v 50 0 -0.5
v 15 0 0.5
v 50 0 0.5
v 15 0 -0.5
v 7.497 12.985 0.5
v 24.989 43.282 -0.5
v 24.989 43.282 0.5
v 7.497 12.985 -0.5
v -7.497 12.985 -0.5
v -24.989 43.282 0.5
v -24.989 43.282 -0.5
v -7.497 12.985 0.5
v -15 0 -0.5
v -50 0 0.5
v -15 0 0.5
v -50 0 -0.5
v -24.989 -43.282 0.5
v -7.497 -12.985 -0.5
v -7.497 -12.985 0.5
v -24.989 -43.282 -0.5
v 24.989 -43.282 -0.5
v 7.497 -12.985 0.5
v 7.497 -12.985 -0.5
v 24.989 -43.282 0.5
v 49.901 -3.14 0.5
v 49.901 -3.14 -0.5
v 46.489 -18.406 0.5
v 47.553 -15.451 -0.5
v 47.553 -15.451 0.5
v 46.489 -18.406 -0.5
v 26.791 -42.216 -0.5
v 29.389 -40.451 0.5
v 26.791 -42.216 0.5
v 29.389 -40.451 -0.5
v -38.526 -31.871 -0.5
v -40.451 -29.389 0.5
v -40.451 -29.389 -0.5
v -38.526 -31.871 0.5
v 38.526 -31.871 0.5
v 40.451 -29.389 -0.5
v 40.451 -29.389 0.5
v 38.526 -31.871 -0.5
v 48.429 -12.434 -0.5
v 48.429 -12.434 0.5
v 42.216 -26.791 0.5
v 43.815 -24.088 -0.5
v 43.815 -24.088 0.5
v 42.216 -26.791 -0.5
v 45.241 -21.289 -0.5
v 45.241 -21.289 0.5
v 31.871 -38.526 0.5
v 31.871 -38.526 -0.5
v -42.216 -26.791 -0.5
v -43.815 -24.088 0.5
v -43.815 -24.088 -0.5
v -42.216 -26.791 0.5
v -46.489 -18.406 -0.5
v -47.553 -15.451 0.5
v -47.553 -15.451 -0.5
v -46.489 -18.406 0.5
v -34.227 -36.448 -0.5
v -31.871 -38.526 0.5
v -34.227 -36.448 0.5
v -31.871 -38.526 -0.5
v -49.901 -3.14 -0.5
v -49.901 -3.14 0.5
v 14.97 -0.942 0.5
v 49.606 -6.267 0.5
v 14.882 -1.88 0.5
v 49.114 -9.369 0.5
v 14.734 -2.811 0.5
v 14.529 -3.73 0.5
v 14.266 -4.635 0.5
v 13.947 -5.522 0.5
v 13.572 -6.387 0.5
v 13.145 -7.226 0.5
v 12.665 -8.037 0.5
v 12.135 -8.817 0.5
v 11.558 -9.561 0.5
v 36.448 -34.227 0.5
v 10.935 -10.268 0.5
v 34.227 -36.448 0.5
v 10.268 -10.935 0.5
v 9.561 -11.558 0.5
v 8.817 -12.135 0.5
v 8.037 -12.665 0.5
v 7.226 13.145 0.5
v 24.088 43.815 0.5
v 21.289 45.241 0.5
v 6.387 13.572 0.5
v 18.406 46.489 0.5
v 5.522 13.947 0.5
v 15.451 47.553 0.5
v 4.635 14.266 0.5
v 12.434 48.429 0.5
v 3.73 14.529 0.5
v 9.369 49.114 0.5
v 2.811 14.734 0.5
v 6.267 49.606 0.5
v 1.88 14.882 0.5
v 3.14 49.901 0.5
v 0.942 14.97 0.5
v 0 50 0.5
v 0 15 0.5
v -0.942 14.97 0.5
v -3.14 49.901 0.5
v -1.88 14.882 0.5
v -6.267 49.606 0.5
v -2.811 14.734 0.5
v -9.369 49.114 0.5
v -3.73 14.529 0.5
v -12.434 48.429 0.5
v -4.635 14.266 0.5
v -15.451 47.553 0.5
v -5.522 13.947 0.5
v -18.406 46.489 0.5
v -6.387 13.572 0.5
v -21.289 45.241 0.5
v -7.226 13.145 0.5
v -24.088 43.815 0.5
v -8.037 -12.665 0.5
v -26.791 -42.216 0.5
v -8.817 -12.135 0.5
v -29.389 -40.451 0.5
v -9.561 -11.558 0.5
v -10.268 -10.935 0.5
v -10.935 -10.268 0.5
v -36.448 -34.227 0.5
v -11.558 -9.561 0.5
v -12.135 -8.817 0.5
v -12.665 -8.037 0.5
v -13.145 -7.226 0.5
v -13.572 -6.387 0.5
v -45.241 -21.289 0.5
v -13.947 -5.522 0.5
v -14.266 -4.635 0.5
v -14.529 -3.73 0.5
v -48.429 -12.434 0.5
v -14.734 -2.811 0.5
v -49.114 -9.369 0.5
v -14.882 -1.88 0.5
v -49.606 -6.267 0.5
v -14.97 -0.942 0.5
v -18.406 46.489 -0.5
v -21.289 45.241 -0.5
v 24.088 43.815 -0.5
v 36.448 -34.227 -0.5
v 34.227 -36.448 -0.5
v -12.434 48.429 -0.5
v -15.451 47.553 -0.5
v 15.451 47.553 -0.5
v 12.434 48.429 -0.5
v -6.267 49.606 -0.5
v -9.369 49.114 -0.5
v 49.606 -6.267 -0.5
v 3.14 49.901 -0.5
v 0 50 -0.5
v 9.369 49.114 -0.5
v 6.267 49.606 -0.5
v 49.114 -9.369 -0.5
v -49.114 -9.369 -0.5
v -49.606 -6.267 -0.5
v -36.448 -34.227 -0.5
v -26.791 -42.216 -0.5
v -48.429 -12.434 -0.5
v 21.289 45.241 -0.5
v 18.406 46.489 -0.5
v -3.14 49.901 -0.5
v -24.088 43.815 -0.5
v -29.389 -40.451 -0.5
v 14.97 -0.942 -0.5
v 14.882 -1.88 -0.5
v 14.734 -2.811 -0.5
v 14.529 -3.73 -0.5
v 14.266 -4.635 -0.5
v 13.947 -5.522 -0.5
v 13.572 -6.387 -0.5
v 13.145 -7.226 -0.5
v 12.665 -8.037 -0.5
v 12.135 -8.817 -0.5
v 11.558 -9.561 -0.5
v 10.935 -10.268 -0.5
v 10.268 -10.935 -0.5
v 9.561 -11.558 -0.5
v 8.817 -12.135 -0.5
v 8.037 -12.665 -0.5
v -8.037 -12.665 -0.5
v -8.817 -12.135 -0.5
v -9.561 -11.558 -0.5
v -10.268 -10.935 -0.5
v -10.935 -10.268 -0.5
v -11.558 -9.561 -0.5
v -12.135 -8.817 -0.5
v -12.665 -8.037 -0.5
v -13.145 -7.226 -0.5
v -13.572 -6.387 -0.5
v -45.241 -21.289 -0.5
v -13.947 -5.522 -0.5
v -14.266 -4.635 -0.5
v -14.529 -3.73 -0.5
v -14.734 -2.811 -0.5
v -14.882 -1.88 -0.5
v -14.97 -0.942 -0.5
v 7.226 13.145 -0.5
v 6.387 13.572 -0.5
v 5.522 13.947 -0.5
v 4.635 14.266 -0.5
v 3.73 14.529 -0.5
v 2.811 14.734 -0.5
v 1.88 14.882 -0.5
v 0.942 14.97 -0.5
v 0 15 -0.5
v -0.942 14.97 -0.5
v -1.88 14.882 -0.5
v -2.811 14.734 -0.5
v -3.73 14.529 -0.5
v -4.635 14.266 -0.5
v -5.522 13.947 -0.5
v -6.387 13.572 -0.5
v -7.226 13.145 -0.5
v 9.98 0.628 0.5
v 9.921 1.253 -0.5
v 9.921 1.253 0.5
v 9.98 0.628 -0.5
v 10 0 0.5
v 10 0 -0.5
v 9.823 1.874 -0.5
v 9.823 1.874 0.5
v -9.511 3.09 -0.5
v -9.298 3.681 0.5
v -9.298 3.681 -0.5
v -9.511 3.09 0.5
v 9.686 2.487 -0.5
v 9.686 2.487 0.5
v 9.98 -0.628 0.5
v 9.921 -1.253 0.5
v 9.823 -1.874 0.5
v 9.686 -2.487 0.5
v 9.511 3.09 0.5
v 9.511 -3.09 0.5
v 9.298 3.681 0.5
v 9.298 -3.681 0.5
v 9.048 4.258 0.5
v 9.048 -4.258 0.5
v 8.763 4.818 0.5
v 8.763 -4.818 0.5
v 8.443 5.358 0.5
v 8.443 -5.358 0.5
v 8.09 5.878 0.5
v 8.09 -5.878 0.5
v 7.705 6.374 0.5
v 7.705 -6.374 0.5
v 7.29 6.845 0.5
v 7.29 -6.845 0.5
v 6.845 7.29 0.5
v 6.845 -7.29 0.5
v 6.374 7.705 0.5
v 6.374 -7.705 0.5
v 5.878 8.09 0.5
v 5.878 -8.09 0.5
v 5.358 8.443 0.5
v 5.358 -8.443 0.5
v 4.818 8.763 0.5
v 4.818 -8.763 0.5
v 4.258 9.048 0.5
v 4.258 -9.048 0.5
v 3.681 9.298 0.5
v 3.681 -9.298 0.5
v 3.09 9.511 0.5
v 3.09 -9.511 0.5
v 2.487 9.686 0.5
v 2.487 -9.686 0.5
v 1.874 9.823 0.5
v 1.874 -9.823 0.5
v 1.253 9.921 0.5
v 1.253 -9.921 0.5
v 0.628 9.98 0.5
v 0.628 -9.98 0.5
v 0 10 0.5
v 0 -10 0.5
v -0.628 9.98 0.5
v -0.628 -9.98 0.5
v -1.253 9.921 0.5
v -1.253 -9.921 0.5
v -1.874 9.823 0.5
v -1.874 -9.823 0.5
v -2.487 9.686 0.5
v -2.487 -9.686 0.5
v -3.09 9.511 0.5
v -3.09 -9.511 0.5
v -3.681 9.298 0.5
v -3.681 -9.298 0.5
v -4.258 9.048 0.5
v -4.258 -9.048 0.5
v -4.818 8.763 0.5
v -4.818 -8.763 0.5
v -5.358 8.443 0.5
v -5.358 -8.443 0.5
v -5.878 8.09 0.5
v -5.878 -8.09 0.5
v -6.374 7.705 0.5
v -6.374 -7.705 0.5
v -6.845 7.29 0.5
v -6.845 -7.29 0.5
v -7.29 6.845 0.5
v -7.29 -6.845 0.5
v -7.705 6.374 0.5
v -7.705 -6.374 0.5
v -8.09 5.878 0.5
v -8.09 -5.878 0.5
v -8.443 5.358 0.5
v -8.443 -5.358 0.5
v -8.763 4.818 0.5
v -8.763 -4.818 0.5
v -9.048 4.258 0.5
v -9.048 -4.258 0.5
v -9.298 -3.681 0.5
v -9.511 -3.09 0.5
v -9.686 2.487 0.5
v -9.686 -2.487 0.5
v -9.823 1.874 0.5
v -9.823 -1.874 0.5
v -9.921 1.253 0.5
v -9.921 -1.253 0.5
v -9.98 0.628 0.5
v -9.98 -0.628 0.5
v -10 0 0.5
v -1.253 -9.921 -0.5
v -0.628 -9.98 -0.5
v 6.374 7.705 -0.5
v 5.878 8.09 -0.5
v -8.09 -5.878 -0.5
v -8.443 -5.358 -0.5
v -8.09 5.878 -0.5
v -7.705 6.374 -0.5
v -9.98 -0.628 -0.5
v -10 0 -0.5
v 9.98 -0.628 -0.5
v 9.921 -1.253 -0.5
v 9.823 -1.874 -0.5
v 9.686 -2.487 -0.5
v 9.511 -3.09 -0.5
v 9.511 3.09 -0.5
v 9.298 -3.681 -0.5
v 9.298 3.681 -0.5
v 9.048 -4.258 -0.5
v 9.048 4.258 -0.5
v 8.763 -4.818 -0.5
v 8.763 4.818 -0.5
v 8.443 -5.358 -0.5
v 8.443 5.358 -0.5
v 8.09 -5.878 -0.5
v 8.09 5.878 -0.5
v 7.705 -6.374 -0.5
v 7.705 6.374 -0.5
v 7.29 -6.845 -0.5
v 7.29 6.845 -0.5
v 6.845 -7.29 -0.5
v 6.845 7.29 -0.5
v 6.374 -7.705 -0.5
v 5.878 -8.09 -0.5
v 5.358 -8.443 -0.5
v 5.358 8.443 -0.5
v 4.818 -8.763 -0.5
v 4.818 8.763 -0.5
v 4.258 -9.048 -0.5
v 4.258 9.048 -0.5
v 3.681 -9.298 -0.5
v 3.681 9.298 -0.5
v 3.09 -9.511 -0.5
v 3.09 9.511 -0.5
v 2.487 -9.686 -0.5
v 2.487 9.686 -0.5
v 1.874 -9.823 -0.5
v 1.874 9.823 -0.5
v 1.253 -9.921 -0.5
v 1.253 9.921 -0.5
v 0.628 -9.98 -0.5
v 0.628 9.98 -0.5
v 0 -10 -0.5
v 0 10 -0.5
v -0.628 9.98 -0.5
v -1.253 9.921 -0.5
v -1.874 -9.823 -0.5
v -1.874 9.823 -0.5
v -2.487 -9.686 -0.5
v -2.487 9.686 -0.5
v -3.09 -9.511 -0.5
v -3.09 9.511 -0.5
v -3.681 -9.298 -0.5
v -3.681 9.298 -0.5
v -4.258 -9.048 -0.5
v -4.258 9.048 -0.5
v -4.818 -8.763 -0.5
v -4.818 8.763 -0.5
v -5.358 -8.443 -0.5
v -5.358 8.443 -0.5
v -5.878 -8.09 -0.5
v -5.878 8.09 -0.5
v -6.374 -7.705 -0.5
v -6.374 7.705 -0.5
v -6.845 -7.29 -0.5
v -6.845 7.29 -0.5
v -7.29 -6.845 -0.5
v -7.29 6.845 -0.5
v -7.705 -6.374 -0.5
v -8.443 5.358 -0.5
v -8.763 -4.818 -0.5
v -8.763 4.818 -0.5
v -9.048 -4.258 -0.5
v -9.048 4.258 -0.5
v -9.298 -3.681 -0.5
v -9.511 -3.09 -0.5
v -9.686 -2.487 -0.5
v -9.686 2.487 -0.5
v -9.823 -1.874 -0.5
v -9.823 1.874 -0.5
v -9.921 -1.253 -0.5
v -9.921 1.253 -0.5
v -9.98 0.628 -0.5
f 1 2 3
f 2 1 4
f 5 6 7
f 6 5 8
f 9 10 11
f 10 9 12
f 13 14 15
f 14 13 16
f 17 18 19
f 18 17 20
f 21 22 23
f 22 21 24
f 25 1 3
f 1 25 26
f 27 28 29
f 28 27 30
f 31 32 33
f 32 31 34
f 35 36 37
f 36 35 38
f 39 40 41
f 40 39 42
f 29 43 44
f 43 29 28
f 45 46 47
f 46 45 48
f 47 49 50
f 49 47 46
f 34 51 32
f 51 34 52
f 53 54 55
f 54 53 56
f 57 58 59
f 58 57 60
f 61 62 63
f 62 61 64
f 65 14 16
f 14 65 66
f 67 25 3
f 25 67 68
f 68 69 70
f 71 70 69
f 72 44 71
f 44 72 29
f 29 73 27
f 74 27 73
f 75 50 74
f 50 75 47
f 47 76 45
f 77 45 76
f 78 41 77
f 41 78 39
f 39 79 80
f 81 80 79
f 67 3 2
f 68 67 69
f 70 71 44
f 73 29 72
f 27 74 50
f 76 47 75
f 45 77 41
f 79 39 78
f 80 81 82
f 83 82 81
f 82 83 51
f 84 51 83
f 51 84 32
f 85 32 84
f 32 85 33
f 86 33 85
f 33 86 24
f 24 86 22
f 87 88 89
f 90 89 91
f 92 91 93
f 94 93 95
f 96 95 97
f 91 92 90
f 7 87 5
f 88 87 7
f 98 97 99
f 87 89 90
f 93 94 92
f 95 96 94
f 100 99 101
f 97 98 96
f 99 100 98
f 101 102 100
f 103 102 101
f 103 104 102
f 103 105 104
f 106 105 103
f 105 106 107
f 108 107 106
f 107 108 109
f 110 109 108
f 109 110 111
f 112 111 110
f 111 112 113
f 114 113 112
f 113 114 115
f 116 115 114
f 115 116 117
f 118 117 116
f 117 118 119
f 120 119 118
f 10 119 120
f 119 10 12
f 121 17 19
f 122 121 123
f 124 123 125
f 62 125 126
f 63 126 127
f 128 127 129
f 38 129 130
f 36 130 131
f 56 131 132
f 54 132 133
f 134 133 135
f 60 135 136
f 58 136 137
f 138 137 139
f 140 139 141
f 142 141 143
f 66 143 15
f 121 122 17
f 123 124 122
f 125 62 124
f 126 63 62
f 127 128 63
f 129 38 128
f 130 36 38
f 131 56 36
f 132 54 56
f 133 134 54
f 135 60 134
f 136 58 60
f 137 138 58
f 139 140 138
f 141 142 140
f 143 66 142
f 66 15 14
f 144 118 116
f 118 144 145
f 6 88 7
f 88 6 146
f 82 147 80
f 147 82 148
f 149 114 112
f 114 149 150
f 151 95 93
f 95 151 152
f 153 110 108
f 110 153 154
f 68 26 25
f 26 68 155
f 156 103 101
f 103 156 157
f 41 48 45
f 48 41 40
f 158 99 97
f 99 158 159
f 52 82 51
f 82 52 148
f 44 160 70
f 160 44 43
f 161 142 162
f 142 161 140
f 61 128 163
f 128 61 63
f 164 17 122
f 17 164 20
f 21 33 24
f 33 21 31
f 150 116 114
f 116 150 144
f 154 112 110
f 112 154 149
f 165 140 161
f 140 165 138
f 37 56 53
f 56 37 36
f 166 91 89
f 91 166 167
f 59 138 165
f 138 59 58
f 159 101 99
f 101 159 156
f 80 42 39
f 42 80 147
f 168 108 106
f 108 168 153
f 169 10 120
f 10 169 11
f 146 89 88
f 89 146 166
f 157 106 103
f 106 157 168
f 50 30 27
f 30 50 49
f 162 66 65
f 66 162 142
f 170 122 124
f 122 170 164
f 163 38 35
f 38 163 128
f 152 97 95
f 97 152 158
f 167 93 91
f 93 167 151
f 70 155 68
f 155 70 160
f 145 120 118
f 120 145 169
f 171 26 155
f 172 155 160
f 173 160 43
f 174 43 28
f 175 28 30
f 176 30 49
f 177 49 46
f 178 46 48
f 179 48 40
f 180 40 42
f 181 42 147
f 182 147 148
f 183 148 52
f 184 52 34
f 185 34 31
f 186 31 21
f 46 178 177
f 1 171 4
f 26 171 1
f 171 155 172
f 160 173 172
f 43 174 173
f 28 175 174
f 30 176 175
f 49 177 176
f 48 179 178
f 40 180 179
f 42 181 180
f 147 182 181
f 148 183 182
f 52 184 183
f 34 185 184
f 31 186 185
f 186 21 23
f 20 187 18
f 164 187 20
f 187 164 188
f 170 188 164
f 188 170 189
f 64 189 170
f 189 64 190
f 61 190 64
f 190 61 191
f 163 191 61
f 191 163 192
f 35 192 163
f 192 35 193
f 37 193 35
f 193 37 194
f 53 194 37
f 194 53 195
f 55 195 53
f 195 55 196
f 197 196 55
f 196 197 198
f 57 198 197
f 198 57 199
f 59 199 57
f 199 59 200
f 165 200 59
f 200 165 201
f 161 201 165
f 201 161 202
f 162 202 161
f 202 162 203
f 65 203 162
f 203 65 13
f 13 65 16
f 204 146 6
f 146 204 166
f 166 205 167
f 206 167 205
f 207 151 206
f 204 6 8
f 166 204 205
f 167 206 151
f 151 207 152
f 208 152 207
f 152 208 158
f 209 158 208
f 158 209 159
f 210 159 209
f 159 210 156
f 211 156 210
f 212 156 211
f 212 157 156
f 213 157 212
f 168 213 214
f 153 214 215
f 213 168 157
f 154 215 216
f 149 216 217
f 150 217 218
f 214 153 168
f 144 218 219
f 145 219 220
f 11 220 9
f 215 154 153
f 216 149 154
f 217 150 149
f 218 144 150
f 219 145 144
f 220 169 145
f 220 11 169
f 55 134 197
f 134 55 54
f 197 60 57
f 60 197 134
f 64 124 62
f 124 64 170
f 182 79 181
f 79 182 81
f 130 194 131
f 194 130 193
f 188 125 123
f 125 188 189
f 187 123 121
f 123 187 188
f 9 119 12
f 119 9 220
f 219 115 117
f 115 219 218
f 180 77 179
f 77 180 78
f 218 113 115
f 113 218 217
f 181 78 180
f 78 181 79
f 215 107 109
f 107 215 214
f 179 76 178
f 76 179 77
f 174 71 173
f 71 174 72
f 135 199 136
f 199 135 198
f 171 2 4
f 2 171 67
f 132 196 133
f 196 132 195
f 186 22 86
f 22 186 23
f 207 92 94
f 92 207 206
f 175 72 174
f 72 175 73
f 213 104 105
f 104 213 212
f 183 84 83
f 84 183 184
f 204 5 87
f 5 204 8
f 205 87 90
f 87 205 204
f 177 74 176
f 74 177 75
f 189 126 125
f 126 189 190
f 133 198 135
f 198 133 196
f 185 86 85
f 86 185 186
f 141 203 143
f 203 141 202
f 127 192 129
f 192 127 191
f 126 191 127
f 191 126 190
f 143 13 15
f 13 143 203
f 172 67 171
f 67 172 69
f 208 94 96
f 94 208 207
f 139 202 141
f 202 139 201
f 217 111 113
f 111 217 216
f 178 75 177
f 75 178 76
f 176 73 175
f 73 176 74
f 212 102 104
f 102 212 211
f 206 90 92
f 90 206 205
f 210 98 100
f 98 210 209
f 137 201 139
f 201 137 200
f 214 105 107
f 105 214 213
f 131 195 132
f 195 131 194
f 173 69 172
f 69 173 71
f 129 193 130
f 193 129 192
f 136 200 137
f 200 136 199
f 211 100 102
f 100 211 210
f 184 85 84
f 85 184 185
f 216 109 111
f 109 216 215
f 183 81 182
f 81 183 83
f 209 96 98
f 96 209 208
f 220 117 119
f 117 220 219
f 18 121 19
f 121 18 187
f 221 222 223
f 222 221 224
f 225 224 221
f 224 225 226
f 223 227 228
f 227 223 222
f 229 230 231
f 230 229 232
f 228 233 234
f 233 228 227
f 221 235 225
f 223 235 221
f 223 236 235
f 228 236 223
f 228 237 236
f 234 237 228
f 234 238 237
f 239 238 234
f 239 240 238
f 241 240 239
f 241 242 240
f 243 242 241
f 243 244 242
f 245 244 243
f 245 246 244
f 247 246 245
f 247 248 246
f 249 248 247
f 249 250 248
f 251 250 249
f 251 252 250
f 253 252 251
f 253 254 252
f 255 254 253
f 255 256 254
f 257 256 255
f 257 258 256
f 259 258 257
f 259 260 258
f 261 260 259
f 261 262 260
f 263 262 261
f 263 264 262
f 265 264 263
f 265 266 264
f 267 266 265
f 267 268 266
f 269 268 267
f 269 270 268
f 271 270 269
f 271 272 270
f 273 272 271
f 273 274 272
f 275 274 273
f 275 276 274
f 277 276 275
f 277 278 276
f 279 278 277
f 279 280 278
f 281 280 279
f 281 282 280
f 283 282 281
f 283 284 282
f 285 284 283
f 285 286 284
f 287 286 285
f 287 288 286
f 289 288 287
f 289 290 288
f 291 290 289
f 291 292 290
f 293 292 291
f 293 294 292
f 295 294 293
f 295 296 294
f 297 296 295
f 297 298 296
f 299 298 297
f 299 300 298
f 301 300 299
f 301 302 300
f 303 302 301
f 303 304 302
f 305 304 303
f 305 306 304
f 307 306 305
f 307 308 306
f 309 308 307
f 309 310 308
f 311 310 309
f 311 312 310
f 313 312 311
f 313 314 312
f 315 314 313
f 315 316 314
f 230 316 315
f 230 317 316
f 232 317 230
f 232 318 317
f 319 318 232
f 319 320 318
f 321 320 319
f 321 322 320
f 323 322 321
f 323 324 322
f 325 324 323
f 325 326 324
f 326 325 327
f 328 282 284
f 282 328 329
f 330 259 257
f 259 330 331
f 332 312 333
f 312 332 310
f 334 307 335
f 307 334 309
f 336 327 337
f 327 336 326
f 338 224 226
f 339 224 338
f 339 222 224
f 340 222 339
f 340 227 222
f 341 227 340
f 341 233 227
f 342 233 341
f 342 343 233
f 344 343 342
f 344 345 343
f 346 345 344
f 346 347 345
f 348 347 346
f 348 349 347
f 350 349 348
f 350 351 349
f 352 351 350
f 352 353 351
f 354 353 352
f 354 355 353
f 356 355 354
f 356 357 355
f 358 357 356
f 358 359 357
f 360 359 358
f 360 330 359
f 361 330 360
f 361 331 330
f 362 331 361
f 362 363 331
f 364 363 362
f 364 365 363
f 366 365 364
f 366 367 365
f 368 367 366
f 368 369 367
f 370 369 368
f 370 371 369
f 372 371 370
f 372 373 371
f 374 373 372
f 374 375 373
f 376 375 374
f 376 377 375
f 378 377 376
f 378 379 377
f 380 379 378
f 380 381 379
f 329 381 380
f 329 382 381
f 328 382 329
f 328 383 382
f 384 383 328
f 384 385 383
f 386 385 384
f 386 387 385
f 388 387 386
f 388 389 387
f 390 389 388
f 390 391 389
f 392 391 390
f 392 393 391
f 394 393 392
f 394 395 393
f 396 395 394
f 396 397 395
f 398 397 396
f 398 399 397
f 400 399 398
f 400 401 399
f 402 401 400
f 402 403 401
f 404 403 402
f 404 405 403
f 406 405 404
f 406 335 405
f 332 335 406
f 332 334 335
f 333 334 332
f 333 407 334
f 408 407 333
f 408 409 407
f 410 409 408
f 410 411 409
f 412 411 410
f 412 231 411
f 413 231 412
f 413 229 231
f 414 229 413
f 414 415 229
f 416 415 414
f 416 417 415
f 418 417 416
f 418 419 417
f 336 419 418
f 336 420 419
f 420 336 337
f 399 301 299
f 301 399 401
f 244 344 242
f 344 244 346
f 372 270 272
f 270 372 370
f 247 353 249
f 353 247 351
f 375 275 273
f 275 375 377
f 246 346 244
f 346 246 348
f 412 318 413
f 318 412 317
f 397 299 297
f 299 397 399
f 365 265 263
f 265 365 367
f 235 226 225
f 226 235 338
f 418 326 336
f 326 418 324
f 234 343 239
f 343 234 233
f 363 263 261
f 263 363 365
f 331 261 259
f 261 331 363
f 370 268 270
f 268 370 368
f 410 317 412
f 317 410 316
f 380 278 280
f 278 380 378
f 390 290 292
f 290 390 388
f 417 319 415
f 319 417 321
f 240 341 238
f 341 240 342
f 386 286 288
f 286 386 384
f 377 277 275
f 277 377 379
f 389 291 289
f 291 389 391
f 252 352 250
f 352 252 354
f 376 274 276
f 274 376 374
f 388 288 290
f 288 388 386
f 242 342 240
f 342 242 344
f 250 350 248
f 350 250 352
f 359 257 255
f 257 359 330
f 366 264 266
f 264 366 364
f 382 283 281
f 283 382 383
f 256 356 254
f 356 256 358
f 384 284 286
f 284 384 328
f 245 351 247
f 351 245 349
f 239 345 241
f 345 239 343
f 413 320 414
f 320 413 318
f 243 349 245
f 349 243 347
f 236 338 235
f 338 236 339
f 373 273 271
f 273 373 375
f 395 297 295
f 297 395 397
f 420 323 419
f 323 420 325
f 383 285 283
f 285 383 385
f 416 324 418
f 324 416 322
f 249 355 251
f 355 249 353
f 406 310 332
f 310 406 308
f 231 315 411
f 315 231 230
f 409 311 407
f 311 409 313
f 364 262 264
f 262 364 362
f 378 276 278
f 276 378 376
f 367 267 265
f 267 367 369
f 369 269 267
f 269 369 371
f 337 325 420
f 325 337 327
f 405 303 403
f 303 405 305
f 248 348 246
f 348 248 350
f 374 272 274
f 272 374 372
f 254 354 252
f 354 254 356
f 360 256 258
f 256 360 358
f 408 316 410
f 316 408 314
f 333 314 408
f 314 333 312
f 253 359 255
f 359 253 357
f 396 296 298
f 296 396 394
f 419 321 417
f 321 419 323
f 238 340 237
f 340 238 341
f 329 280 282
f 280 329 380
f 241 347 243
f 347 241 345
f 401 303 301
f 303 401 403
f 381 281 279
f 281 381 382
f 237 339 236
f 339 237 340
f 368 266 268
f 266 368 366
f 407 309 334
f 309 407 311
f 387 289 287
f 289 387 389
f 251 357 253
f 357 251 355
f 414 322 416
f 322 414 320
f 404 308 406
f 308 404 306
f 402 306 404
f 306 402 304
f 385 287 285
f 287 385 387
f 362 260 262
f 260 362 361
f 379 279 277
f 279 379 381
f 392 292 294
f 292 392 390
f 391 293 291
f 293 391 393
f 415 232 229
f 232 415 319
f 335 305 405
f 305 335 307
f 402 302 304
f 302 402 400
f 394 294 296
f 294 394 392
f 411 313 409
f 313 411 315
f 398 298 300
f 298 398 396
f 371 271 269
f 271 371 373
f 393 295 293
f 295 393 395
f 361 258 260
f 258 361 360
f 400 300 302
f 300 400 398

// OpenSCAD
/* Coded by Ben Rockhold */

/*	Customizer Variables	*/
OuterRadius = 50;
TrefoilHeight = 1;
//The ISO standard calls for a Trefoil with an inner circle of r, and three blades of inner radius 1.5*r and outer of 5*r, separated by 60 degrees. However, I have made this ratio editable here. I don't recommend changing them.
InnerRatio = 1.5;
OuterRatio = 5;
ResolutionMultiplier = 10;

Trefoil(OuterRadius,TrefoilHeight,InnerRatio,OuterRatio,ResolutionMultiplier);
//Animation is fun, but... kinda broken, and pointless.
//rotate(a=$t*100000){Trefoil(OuterRadius,TrefoilHeight,Ratio,ResolutionMultiplier);}

module Trefoil(outradius,height,inRatio,outRatio,rez){
	inradius = outradius/outRatio;
	union(){
		cylinder(r=inradius,height,center=true, $fn=inradius*rez);
		difference(){
			cylinder(r=outradius,height,center=true, $fn=inradius*rez);
			cylinder(r=inradius*inRatio,height*2,center=true, $fn=inradius*rez);
			for(i=[0:3]){
				rotate(a = i*120) {
				linear_extrude(height=height+1, center=true)
				polygon(points=[[0,0],[2*outradius,0],[(2*outradius)*cos(60),(2*outradius)*sin(60)]], paths=[[0,1,2]]);
				}
			}
		}
	}
}
